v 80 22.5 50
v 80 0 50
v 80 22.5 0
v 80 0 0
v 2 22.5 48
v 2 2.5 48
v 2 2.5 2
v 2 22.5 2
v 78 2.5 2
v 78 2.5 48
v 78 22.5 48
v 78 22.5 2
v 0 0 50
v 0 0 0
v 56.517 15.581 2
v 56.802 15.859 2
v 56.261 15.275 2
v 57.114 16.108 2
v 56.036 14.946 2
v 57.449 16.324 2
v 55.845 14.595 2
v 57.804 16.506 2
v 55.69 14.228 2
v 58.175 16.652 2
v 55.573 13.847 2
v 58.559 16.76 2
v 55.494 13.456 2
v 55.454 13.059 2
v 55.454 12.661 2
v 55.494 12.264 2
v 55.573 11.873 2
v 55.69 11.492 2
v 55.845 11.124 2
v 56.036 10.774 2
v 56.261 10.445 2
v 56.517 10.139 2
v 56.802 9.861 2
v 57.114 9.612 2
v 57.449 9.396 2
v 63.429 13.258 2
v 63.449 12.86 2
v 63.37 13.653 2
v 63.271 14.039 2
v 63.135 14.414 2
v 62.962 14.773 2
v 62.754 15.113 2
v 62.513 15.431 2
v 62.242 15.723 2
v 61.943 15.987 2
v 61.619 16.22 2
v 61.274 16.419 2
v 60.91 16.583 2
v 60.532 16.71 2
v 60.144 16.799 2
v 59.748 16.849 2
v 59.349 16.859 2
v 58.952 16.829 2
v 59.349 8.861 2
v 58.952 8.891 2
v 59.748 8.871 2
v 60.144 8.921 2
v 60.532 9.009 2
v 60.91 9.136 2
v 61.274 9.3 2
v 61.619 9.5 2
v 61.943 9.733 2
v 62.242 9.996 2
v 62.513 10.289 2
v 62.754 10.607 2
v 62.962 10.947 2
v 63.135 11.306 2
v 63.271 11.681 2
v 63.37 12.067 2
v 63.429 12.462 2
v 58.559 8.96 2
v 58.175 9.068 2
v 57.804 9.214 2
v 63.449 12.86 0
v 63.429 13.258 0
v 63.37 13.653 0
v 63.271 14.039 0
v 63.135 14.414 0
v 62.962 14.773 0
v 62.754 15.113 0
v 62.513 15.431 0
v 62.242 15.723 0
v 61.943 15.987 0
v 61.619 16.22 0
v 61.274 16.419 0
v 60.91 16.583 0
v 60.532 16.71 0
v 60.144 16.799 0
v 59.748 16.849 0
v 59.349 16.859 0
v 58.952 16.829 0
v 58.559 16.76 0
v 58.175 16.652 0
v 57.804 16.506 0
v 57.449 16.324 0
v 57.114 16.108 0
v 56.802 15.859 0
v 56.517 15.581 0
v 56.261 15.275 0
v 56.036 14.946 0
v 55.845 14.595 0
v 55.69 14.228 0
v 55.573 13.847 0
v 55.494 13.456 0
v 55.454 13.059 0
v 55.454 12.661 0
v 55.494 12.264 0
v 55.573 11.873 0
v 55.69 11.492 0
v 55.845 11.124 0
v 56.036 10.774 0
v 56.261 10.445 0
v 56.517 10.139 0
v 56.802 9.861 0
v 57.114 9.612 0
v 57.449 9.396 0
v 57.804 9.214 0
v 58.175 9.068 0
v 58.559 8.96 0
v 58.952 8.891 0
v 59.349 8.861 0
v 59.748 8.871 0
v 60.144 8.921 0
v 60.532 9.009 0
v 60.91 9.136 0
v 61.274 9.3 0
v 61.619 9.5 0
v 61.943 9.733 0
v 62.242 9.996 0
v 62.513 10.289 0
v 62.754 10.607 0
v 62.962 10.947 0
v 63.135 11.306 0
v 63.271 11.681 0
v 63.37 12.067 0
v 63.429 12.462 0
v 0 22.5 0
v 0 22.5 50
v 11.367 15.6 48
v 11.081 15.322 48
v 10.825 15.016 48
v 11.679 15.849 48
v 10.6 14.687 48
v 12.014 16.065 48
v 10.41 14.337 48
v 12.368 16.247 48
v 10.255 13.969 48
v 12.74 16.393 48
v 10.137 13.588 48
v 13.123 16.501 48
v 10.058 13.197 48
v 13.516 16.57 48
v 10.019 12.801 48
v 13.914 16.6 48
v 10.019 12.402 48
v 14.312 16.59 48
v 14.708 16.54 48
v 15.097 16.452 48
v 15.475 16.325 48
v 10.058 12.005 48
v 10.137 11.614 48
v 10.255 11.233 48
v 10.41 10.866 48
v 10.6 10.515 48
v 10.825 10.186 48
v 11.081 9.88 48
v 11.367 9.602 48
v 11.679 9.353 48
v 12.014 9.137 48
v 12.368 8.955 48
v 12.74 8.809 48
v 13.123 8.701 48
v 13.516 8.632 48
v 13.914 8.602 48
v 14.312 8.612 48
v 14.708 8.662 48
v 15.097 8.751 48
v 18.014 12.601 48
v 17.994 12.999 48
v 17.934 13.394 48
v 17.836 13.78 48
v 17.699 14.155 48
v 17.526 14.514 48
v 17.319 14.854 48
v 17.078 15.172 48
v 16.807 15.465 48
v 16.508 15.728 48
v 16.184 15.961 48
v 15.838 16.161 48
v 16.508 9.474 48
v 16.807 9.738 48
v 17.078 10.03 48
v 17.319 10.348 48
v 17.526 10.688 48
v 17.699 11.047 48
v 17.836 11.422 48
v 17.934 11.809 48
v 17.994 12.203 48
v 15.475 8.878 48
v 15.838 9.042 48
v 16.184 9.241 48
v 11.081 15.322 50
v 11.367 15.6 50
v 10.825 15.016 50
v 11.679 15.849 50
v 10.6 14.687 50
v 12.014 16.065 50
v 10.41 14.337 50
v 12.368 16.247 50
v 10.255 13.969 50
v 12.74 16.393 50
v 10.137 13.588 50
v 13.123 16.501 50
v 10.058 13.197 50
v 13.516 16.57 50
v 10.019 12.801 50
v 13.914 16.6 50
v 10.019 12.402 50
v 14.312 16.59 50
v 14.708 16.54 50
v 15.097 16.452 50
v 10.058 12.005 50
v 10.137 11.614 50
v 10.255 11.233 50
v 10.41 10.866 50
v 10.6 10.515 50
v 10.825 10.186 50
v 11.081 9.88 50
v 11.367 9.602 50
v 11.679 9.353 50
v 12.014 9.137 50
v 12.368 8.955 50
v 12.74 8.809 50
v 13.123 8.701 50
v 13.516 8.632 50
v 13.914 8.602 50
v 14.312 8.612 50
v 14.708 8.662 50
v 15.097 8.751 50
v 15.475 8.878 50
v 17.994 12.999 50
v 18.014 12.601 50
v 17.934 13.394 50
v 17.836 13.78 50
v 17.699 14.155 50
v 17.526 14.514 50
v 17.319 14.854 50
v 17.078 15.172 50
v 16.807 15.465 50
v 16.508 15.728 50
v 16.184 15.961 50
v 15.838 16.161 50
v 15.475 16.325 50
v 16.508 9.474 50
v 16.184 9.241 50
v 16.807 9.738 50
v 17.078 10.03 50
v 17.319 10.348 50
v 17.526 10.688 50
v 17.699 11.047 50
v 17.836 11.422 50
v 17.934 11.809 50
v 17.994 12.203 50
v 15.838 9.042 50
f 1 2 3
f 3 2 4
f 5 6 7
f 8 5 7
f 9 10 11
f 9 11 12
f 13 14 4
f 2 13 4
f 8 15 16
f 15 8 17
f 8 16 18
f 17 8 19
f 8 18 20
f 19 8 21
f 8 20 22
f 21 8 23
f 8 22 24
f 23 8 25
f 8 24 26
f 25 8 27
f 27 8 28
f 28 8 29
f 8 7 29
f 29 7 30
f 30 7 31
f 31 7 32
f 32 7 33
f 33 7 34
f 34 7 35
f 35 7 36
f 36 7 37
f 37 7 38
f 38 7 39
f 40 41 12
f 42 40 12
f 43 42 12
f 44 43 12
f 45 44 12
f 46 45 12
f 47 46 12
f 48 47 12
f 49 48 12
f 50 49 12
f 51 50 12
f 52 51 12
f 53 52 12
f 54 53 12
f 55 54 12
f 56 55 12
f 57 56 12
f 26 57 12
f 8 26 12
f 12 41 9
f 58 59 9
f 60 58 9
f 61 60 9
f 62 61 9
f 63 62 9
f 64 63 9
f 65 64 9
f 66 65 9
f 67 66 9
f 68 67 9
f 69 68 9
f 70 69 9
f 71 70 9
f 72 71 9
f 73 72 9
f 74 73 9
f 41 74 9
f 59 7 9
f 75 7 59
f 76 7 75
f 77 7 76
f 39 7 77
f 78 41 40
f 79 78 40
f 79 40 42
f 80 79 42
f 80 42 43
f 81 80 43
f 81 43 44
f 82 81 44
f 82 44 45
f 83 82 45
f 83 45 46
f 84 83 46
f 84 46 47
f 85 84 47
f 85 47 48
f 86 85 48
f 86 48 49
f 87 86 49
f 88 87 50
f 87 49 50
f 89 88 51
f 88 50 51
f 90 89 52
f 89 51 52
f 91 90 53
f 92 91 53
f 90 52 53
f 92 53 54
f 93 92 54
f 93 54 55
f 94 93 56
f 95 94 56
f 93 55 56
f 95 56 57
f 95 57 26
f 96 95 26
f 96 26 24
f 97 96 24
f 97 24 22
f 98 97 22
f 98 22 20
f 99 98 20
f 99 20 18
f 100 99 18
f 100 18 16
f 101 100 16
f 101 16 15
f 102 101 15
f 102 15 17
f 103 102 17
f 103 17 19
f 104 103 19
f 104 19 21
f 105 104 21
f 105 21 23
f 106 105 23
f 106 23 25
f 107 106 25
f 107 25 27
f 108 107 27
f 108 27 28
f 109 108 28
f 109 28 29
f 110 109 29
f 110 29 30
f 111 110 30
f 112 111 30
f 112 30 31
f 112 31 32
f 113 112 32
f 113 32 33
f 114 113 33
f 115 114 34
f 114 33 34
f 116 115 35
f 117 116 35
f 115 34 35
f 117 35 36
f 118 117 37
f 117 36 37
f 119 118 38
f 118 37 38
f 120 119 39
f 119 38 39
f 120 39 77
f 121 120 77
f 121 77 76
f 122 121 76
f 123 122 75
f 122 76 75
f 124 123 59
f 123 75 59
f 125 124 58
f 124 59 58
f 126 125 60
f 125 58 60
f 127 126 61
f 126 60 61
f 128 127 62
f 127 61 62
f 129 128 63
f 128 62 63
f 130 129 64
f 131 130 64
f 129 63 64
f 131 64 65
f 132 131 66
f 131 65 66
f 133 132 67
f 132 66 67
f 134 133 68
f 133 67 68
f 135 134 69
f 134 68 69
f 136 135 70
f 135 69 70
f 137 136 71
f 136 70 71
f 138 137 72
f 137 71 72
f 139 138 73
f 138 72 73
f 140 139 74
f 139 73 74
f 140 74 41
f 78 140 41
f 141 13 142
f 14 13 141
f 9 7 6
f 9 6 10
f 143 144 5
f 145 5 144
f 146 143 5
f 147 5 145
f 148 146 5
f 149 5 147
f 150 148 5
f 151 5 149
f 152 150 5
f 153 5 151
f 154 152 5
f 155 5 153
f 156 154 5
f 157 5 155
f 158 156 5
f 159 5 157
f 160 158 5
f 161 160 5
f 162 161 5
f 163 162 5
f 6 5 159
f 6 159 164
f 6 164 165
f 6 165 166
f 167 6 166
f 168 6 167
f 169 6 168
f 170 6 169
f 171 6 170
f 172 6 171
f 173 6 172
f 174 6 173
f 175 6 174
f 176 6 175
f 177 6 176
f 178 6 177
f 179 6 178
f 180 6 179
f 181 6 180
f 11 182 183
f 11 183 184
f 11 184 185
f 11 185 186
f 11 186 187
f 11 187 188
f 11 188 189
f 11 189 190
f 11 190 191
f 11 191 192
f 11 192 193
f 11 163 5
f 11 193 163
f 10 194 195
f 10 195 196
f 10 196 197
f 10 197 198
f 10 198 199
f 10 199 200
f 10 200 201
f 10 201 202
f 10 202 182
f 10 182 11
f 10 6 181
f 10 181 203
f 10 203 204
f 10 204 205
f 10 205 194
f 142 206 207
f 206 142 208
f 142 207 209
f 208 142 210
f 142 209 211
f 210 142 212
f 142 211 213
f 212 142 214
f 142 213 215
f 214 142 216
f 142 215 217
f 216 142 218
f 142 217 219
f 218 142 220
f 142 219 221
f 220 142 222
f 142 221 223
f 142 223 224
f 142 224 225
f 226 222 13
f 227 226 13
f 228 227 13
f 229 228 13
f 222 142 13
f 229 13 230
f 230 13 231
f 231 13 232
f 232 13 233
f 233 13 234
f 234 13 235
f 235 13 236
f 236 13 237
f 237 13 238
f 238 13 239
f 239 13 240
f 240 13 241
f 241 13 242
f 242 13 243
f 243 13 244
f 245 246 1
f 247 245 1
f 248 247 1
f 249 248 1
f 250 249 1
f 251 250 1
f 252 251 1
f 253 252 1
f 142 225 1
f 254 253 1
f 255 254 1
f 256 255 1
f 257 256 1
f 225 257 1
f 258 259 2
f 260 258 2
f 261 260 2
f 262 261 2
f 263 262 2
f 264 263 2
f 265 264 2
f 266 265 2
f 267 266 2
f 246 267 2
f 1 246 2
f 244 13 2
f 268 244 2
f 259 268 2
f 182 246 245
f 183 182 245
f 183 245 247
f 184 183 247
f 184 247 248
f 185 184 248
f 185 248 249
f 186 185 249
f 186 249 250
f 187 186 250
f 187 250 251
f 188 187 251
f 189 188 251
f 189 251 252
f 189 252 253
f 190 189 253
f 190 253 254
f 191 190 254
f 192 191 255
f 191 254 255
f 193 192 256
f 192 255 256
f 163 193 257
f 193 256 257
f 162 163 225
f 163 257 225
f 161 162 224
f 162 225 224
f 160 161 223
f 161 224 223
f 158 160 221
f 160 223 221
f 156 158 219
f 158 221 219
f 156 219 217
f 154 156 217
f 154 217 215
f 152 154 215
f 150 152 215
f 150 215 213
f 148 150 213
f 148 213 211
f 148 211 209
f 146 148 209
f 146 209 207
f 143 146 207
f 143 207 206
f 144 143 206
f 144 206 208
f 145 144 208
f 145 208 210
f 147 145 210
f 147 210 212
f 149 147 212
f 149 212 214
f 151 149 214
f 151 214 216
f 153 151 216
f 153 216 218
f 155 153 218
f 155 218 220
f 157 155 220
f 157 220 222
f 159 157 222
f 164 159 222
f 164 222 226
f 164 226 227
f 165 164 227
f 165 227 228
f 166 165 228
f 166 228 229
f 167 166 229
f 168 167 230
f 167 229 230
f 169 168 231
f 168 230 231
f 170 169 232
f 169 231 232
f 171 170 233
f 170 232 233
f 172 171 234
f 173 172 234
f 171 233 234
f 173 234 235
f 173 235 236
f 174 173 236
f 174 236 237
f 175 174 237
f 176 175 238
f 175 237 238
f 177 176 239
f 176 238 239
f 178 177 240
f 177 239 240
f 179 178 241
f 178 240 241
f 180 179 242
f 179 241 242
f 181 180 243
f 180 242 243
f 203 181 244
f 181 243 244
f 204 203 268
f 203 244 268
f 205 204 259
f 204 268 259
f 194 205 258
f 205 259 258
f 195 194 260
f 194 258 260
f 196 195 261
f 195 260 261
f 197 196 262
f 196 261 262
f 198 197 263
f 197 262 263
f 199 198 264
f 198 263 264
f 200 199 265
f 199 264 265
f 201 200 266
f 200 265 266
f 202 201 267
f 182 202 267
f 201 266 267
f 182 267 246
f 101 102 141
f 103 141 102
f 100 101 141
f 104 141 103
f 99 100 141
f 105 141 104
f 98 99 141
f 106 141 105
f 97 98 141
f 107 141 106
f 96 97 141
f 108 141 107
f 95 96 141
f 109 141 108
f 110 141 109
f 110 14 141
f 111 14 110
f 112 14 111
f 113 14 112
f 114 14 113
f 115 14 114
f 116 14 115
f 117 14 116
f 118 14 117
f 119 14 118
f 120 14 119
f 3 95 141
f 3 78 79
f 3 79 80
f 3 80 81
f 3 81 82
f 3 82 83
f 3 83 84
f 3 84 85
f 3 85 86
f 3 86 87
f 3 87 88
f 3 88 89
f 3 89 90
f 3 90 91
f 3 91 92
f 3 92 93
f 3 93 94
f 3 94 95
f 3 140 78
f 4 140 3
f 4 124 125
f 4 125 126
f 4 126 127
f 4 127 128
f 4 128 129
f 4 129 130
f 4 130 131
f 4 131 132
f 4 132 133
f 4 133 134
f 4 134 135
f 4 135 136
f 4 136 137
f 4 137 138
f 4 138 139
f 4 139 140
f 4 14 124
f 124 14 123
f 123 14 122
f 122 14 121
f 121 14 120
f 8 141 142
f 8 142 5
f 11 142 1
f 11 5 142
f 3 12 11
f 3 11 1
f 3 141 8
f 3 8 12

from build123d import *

# Parameters (mm, degrees)
SKETCH1_W           = 80
SKETCH1_H           = 50
BOSS_EXTRUDE1_DEPTH = 2.5
SKETCH2_W           = 80
SKETCH2_H           = 50
SKETCH2_W_2         = 76
SKETCH2_H_2         = 46
BOSS_EXTRUDE2_DEPTH = 20
SKETCH3_R           = 4
CUT_EXTRUDE1_DEPTH  = 20
SKETCH4_R           = 4
CUT_EXTRUDE2_DEPTH  = 20


with BuildPart() as part:
    # Sketch1 → Boss-Extrude1 (new body)
    with BuildSketch(Plane(origin=(0, 0, 0), x_dir=(1, 0, 0), z_dir=(0, 1, 0))):
        with Locations((40, -25)):
            Rectangle(SKETCH1_W, SKETCH1_H)
    extrude(amount=BOSS_EXTRUDE1_DEPTH)

    # Sketch2 → Boss-Extrude2 (add)
    with BuildSketch(Plane(origin=(0, 2.5, 0), x_dir=(1, 0, 0), z_dir=(0, 1, 0))):
        with Locations((40, -25)):
            Rectangle(SKETCH2_W, SKETCH2_H)
        with Locations((40, -25)):
            Rectangle(SKETCH2_W_2, SKETCH2_H_2, mode=Mode.SUBTRACT)
    extrude(amount=BOSS_EXTRUDE2_DEPTH)

    # Sketch3 → Cut-Extrude1 (cut)
    with BuildSketch(Plane.XY.offset(50)):
        with Locations((14.013555164, 12.601165946)):
            Circle(SKETCH3_R)
    extrude(amount=-CUT_EXTRUDE1_DEPTH, mode=Mode.SUBTRACT)

    # Sketch4 → Cut-Extrude2 (cut)
    with BuildSketch(Plane.XY.offset(2)):
        with Locations((59.449039137, 12.859939565)):
            Circle(SKETCH4_R)
    extrude(amount=-CUT_EXTRUDE2_DEPTH, mode=Mode.SUBTRACT)


solid = part.part
